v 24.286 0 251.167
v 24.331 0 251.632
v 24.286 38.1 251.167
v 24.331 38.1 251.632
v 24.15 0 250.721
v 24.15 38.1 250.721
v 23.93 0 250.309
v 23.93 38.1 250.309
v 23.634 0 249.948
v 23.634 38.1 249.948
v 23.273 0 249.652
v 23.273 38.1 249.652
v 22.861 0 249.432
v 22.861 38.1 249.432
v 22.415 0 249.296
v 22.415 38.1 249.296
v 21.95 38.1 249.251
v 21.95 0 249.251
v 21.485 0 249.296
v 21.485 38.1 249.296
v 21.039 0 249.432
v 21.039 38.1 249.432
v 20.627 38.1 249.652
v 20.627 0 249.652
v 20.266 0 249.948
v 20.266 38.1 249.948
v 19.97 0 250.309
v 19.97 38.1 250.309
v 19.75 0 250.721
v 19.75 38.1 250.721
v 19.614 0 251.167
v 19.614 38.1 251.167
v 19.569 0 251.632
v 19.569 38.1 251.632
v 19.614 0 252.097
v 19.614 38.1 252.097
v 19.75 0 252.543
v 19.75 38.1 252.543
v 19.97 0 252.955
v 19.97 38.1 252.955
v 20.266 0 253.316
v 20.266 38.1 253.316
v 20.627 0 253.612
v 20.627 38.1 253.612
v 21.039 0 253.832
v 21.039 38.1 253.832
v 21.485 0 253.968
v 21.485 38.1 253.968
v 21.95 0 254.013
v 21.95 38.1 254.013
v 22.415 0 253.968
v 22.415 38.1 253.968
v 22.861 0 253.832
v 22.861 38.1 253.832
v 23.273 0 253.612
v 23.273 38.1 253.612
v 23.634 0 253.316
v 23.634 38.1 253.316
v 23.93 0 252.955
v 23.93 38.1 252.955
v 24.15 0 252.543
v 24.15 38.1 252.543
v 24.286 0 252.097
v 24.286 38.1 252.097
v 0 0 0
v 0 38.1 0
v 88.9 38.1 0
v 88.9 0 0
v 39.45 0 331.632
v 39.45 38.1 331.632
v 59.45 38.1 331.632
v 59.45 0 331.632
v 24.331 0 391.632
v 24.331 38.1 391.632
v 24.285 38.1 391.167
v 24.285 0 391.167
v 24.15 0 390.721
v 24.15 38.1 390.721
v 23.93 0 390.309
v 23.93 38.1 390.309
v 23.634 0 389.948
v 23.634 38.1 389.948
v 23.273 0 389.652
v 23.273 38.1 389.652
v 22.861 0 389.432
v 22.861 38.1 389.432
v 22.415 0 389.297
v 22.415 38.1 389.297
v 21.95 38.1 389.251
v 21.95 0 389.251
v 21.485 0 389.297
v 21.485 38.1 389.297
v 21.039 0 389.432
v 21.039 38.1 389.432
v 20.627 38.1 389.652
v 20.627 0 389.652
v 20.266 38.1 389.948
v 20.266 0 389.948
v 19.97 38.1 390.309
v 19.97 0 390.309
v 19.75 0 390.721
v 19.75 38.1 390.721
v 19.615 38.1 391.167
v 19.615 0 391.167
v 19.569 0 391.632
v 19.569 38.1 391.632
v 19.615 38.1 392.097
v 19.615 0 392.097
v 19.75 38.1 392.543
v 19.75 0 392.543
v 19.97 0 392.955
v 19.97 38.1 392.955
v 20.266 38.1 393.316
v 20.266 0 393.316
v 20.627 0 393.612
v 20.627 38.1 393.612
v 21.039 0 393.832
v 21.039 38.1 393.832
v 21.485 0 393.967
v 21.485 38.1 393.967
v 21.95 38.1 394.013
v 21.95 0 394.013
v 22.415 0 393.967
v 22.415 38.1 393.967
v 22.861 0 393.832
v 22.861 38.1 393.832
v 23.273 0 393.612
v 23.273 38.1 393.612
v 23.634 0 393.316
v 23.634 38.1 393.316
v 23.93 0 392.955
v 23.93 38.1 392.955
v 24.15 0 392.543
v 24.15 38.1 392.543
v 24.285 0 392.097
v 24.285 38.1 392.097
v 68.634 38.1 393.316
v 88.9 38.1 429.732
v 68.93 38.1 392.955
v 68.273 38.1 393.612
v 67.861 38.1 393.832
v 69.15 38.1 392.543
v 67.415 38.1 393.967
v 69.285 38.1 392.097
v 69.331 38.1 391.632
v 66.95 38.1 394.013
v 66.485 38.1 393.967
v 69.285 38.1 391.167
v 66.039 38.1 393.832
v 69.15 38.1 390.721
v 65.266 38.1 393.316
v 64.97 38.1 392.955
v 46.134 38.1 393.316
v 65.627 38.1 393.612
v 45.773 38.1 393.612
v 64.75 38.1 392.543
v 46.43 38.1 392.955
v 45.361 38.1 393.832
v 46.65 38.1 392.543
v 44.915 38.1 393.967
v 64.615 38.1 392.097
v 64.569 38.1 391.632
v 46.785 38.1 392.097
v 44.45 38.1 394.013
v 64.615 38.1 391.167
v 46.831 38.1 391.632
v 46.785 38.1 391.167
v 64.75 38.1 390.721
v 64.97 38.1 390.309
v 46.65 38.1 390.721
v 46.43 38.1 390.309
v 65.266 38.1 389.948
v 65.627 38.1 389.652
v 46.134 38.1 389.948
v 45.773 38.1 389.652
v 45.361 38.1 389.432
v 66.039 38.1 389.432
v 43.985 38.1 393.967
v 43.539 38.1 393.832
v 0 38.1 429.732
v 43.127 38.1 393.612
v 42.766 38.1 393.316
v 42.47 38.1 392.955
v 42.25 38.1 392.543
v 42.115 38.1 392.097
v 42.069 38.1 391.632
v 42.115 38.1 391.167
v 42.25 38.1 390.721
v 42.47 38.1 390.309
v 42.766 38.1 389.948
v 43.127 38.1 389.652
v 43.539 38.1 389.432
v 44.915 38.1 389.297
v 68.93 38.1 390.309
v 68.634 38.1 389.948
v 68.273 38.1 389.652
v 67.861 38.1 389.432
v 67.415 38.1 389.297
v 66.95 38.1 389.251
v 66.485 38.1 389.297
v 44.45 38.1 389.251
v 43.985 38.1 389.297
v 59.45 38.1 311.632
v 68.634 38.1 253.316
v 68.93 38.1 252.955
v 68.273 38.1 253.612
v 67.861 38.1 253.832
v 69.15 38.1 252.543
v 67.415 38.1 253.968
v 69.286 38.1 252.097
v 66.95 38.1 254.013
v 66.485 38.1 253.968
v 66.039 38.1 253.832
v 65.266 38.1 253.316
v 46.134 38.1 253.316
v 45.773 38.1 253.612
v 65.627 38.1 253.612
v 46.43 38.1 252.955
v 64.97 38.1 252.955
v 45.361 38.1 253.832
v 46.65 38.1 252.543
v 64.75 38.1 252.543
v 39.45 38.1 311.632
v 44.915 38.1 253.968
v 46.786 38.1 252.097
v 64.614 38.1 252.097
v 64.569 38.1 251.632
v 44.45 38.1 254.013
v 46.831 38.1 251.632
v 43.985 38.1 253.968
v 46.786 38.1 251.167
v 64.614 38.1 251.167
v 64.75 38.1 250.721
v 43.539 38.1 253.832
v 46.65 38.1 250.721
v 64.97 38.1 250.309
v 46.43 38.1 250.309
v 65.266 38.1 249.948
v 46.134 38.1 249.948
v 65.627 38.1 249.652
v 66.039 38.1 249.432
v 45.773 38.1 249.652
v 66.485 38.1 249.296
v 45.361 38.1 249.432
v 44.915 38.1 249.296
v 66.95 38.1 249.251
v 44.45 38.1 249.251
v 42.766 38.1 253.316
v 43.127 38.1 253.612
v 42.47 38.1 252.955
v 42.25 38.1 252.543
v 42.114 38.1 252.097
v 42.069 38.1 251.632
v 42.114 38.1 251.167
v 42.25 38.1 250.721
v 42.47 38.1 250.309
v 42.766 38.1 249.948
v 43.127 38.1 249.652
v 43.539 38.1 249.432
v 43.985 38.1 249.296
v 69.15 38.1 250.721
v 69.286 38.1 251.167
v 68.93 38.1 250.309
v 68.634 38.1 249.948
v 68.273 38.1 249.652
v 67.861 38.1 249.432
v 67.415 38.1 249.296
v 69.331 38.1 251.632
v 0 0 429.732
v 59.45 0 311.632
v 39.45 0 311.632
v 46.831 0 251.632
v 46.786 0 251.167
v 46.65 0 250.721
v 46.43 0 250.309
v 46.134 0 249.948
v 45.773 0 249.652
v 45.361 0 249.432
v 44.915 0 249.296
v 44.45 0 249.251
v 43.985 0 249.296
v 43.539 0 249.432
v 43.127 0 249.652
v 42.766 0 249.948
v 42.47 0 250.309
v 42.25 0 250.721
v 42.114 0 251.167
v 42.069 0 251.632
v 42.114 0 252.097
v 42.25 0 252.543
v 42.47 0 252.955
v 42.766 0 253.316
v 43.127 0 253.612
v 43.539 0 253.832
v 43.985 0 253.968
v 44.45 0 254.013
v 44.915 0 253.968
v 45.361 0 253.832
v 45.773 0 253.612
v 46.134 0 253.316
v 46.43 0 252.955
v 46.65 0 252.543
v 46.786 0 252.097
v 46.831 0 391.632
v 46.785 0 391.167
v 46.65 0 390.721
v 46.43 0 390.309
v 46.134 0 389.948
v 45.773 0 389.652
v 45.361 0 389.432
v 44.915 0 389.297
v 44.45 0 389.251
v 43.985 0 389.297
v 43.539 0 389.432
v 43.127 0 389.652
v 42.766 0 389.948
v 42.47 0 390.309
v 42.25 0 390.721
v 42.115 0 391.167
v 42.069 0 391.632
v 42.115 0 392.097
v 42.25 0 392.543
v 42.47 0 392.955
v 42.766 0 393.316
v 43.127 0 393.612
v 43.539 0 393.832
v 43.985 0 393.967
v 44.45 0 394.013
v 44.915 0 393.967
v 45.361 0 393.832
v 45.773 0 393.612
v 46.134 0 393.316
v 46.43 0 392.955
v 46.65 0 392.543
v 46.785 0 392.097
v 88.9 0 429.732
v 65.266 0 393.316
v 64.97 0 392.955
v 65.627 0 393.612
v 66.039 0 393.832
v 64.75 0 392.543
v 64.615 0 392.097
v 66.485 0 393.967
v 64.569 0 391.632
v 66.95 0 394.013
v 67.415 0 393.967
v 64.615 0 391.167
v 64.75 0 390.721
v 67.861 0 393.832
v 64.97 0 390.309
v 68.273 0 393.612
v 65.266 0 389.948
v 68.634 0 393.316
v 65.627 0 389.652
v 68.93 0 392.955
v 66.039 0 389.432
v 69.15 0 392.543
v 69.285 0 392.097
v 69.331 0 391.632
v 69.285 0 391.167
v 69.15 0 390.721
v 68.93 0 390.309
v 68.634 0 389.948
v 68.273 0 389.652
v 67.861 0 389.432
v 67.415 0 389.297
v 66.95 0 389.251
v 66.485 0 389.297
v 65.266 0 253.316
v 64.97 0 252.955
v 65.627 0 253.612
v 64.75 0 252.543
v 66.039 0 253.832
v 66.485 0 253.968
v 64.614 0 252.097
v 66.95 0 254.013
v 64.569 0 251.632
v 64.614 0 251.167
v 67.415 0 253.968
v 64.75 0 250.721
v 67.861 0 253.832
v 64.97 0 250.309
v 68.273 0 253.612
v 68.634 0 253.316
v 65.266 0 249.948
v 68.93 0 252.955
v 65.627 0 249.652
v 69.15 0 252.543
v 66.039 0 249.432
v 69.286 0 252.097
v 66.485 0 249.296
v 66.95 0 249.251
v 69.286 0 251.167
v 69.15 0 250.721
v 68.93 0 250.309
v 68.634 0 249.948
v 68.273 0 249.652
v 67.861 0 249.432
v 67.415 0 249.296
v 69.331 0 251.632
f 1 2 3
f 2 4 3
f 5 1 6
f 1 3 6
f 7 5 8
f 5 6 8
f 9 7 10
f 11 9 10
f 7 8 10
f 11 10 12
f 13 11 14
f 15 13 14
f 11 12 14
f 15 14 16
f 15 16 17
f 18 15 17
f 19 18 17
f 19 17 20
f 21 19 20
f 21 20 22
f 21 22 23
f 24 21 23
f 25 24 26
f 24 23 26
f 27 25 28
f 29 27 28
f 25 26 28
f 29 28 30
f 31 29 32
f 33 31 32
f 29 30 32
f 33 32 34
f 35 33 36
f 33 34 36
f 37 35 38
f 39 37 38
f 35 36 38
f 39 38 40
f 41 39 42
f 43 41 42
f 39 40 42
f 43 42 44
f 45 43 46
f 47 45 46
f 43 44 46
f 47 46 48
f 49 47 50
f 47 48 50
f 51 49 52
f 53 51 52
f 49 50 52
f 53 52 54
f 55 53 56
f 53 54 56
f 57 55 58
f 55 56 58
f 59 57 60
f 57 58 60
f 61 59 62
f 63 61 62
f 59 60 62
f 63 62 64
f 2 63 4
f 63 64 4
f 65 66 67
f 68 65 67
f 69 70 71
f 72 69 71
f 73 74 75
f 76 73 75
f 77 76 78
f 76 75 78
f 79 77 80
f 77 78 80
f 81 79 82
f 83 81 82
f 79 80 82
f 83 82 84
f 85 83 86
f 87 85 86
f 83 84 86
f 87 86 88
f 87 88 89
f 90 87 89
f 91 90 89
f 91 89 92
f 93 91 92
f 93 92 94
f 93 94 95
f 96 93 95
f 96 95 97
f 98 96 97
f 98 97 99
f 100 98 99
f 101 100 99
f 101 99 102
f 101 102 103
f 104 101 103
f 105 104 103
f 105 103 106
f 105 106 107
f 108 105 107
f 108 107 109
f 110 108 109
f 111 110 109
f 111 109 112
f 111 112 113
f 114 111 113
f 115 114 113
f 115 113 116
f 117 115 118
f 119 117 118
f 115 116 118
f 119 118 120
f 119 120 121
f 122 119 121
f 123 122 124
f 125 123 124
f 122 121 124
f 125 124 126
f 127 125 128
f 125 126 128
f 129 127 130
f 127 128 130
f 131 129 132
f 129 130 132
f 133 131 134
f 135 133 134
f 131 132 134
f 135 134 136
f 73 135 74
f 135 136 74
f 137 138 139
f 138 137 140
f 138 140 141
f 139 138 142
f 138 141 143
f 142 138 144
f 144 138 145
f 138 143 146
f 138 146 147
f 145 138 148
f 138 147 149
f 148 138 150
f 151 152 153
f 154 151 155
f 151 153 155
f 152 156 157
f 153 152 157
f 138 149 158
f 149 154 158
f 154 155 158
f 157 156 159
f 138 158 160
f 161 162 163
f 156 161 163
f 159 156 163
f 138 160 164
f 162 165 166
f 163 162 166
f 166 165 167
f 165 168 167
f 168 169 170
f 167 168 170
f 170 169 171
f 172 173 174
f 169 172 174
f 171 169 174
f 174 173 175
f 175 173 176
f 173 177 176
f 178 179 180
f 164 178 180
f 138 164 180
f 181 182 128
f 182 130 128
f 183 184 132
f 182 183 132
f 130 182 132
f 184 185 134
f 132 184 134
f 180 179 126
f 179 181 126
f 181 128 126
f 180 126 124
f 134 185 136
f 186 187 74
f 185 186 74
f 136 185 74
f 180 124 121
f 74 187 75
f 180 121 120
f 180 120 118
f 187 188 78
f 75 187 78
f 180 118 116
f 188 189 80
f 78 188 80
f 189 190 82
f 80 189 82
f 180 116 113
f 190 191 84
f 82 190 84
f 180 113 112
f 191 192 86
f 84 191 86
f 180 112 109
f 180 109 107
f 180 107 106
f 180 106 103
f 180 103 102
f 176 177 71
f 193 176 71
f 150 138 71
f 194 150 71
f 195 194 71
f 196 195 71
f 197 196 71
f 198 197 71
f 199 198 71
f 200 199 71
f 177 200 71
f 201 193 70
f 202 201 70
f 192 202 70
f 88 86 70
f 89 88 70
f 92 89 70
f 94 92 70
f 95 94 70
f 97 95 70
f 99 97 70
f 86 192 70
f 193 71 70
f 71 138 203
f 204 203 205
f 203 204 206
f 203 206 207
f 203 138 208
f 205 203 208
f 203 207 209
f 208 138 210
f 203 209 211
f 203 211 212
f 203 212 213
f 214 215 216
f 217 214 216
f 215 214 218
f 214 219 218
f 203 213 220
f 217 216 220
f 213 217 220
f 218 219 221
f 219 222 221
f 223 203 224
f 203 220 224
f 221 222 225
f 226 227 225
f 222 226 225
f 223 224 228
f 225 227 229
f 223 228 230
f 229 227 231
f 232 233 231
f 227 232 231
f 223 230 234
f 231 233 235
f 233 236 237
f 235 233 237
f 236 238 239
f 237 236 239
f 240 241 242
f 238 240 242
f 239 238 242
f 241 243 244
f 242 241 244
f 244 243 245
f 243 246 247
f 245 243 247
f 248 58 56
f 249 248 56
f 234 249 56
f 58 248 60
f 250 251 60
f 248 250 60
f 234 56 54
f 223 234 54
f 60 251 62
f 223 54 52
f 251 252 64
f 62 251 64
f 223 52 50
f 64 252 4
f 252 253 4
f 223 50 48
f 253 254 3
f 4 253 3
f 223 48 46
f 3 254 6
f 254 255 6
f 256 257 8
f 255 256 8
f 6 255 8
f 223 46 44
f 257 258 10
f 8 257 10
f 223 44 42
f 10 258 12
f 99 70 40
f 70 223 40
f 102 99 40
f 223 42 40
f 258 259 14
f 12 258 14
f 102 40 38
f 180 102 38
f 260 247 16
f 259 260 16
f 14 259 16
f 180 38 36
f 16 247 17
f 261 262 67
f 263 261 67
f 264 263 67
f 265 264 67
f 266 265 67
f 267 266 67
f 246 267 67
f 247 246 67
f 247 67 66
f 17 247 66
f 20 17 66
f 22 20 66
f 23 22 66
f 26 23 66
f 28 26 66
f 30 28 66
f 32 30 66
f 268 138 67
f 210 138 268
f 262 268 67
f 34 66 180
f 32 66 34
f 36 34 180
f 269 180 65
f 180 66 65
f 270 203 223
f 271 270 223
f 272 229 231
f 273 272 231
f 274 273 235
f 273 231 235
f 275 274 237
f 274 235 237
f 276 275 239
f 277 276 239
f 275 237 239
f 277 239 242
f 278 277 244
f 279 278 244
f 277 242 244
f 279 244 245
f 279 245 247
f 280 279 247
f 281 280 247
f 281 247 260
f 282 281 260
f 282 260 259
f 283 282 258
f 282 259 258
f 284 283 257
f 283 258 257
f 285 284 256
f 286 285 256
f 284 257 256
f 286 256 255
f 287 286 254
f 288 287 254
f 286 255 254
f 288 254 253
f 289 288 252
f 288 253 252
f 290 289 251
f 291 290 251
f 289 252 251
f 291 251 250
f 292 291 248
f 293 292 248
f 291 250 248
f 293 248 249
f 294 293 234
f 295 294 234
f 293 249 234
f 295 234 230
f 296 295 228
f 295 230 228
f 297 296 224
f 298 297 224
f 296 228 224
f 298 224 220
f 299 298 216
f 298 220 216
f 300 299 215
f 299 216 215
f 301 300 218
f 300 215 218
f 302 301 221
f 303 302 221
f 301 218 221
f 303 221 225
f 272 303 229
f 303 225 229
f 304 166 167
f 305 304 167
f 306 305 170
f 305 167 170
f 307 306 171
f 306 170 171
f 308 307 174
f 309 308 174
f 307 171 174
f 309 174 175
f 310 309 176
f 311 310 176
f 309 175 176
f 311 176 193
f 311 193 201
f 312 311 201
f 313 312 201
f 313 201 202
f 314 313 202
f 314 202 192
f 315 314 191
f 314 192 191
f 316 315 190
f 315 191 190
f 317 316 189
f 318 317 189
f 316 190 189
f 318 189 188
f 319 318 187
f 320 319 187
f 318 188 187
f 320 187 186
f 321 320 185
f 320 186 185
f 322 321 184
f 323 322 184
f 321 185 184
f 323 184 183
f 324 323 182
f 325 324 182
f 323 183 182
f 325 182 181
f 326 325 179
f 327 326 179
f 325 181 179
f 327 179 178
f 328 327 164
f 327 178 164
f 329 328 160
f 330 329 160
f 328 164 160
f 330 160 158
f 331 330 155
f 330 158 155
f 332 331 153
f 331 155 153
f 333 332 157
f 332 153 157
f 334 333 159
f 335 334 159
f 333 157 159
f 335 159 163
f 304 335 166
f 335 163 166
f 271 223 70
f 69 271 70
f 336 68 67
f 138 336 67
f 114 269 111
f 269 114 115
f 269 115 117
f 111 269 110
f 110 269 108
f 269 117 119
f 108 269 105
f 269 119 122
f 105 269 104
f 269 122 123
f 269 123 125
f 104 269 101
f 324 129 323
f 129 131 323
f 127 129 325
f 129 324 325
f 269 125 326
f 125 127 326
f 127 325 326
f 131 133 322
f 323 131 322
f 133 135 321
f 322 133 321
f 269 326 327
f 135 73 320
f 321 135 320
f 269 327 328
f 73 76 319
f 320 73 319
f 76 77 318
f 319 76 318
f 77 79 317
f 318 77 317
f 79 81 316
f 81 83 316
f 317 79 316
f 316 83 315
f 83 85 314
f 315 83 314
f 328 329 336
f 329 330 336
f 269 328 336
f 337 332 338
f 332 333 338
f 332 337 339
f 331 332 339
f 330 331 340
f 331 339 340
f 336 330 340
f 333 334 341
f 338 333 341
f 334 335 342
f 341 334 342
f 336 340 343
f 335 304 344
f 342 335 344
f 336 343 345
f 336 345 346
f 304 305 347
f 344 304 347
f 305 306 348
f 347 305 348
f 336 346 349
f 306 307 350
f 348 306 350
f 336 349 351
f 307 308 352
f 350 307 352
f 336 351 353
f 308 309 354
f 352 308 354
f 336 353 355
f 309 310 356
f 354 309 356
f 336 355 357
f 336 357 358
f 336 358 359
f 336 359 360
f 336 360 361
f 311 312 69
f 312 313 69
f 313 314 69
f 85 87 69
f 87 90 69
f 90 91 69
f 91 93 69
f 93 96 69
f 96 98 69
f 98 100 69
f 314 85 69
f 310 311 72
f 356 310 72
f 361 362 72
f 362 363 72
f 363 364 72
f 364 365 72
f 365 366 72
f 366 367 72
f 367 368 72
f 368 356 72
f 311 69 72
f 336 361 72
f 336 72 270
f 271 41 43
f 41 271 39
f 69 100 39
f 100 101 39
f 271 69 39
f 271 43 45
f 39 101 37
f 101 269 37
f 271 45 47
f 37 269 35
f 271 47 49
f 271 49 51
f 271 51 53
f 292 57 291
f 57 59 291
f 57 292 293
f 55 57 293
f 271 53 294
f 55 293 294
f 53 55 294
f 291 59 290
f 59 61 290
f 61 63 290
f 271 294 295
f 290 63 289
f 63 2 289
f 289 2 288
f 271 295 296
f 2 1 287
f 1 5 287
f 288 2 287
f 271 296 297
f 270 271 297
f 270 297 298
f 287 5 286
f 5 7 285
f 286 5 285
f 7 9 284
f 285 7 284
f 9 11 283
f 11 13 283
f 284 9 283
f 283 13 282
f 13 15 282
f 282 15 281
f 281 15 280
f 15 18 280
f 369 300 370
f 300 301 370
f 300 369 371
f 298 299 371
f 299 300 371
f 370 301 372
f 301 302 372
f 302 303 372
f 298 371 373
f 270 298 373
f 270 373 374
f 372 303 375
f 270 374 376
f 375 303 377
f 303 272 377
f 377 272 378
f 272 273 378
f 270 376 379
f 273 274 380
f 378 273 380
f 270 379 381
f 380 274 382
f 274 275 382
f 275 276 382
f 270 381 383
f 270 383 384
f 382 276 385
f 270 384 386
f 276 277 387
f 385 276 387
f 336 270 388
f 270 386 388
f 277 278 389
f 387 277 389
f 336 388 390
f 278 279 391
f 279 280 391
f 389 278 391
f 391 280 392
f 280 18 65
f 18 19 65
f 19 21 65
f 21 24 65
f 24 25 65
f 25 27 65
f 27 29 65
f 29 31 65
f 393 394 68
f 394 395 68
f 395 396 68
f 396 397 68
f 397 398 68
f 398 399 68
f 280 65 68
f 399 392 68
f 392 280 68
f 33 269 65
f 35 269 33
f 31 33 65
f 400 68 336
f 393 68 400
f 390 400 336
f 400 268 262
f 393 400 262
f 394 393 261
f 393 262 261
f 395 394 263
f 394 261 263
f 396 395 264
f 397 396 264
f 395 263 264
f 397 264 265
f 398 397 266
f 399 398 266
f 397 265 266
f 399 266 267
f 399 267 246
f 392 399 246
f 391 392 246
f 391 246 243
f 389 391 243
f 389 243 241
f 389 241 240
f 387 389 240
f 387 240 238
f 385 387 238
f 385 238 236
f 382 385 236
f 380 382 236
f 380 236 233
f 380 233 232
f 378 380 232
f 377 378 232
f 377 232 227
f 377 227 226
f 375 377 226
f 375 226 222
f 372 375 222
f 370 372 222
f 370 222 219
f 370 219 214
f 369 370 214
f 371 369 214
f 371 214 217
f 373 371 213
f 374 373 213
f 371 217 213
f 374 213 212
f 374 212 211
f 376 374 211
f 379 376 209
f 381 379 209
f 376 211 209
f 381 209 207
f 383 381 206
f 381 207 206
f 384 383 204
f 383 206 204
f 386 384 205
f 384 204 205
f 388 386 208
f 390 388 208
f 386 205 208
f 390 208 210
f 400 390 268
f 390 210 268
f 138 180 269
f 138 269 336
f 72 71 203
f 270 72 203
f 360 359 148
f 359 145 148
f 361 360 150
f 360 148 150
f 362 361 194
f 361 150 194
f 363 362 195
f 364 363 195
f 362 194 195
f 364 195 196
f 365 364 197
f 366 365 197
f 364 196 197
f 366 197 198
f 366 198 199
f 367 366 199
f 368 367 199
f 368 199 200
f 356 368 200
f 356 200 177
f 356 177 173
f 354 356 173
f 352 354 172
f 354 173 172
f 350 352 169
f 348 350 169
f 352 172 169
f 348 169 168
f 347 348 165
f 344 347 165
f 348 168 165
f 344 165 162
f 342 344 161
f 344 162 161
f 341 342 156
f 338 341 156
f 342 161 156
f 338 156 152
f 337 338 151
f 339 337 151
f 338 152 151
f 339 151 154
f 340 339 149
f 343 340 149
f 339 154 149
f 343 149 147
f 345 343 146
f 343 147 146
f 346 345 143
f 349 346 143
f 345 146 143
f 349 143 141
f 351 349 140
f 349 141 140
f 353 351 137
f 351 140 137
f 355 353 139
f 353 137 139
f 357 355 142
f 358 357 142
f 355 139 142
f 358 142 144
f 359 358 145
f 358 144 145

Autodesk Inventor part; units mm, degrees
ref_plane "YZ Plane" through (0, 0, 0) normal (1, 0, 0) x (0, 1, 0)
ref_plane "XZ Plane" through (0, 0, 0) normal (0, 1, 0) x (-1, 0, 0)
ref_plane "XY Plane" through (0, 0, 0) normal (0, 0, 1) x (1, 0, 0)
sketch "Sketch1" plane through (0, 0, 0) normal (0, 0, 1) x (1, 0, 0)
  line L0 (0, 0) -> (88.9, 0)
  line L1 (88.9, 0) -> (88.9, 38.1)
  line L2 (88.9, 38.1) -> (0, 38.1)
  line L3 (0, 38.1) -> (0, 0)
  dimension "d0" = 88.9
  dimension "d1" = 38.1
extrude "Extrusion1" add sketch "Sketch1" along normal blind 429.732
sketch "Sketch2" plane through (0, 38.1, 0) normal (0, 1, 0) x (1, 0, 0)
  line L0 (66.95, -391.632) -> (21.95, -391.632) construction
  line L1 (21.95, -391.632) -> (21.95, -251.632) construction
  line L2 (21.95, -251.632) -> (66.95, -251.632) construction
  line L3 (66.95, -251.632) -> (66.95, -391.632) construction
  circle A0 centre (21.95, -391.632) radius 2.3812
  circle A1 centre (44.45, -391.632) radius 2.3812
  circle A2 centre (66.95, -391.632) radius 2.3812
  circle A3 centre (66.95, -251.632) radius 2.3813
  circle A4 centre (44.45, -251.632) radius 2.3813
  circle A5 centre (21.95, -251.632) radius 2.3813
  line L4 (44.45, -391.632) -> (44.45, -251.632) construction
  line L5 (21.95, -321.632) -> (66.95, -321.632) construction
  line L6 (88.9, -429.732) -> (0, -429.732) projected
  line L7 (39.45, -331.632) -> (59.45, -331.632)
  line L8 (59.45, -331.632) -> (59.45, -311.632)
  line L9 (59.45, -311.632) -> (39.45, -311.632)
  line L10 (39.45, -311.632) -> (39.45, -331.632)
  point P0 (0, 0)
  point P1 (44.45, -429.732)
  dimension "d4" = 45
  dimension "d5" = 140
  dimension "d6" = 4.7625
  dimension "d7" = 4.7625
  dimension "d8" = 4.7625
  dimension "d9" = 4.7625
  dimension "d10" = 4.7625
  dimension "d11" = 4.7625
  dimension "d12" = 38.1
  dimension "d13" = 60
  dimension "d14" = 7.5
  dimension "d15" = 20
  dimension "d16" = 20
extrude "Extrusion2" cut sketch "Sketch2" against normal through all
properties part number "BO03" material "Wood (Oak)"
